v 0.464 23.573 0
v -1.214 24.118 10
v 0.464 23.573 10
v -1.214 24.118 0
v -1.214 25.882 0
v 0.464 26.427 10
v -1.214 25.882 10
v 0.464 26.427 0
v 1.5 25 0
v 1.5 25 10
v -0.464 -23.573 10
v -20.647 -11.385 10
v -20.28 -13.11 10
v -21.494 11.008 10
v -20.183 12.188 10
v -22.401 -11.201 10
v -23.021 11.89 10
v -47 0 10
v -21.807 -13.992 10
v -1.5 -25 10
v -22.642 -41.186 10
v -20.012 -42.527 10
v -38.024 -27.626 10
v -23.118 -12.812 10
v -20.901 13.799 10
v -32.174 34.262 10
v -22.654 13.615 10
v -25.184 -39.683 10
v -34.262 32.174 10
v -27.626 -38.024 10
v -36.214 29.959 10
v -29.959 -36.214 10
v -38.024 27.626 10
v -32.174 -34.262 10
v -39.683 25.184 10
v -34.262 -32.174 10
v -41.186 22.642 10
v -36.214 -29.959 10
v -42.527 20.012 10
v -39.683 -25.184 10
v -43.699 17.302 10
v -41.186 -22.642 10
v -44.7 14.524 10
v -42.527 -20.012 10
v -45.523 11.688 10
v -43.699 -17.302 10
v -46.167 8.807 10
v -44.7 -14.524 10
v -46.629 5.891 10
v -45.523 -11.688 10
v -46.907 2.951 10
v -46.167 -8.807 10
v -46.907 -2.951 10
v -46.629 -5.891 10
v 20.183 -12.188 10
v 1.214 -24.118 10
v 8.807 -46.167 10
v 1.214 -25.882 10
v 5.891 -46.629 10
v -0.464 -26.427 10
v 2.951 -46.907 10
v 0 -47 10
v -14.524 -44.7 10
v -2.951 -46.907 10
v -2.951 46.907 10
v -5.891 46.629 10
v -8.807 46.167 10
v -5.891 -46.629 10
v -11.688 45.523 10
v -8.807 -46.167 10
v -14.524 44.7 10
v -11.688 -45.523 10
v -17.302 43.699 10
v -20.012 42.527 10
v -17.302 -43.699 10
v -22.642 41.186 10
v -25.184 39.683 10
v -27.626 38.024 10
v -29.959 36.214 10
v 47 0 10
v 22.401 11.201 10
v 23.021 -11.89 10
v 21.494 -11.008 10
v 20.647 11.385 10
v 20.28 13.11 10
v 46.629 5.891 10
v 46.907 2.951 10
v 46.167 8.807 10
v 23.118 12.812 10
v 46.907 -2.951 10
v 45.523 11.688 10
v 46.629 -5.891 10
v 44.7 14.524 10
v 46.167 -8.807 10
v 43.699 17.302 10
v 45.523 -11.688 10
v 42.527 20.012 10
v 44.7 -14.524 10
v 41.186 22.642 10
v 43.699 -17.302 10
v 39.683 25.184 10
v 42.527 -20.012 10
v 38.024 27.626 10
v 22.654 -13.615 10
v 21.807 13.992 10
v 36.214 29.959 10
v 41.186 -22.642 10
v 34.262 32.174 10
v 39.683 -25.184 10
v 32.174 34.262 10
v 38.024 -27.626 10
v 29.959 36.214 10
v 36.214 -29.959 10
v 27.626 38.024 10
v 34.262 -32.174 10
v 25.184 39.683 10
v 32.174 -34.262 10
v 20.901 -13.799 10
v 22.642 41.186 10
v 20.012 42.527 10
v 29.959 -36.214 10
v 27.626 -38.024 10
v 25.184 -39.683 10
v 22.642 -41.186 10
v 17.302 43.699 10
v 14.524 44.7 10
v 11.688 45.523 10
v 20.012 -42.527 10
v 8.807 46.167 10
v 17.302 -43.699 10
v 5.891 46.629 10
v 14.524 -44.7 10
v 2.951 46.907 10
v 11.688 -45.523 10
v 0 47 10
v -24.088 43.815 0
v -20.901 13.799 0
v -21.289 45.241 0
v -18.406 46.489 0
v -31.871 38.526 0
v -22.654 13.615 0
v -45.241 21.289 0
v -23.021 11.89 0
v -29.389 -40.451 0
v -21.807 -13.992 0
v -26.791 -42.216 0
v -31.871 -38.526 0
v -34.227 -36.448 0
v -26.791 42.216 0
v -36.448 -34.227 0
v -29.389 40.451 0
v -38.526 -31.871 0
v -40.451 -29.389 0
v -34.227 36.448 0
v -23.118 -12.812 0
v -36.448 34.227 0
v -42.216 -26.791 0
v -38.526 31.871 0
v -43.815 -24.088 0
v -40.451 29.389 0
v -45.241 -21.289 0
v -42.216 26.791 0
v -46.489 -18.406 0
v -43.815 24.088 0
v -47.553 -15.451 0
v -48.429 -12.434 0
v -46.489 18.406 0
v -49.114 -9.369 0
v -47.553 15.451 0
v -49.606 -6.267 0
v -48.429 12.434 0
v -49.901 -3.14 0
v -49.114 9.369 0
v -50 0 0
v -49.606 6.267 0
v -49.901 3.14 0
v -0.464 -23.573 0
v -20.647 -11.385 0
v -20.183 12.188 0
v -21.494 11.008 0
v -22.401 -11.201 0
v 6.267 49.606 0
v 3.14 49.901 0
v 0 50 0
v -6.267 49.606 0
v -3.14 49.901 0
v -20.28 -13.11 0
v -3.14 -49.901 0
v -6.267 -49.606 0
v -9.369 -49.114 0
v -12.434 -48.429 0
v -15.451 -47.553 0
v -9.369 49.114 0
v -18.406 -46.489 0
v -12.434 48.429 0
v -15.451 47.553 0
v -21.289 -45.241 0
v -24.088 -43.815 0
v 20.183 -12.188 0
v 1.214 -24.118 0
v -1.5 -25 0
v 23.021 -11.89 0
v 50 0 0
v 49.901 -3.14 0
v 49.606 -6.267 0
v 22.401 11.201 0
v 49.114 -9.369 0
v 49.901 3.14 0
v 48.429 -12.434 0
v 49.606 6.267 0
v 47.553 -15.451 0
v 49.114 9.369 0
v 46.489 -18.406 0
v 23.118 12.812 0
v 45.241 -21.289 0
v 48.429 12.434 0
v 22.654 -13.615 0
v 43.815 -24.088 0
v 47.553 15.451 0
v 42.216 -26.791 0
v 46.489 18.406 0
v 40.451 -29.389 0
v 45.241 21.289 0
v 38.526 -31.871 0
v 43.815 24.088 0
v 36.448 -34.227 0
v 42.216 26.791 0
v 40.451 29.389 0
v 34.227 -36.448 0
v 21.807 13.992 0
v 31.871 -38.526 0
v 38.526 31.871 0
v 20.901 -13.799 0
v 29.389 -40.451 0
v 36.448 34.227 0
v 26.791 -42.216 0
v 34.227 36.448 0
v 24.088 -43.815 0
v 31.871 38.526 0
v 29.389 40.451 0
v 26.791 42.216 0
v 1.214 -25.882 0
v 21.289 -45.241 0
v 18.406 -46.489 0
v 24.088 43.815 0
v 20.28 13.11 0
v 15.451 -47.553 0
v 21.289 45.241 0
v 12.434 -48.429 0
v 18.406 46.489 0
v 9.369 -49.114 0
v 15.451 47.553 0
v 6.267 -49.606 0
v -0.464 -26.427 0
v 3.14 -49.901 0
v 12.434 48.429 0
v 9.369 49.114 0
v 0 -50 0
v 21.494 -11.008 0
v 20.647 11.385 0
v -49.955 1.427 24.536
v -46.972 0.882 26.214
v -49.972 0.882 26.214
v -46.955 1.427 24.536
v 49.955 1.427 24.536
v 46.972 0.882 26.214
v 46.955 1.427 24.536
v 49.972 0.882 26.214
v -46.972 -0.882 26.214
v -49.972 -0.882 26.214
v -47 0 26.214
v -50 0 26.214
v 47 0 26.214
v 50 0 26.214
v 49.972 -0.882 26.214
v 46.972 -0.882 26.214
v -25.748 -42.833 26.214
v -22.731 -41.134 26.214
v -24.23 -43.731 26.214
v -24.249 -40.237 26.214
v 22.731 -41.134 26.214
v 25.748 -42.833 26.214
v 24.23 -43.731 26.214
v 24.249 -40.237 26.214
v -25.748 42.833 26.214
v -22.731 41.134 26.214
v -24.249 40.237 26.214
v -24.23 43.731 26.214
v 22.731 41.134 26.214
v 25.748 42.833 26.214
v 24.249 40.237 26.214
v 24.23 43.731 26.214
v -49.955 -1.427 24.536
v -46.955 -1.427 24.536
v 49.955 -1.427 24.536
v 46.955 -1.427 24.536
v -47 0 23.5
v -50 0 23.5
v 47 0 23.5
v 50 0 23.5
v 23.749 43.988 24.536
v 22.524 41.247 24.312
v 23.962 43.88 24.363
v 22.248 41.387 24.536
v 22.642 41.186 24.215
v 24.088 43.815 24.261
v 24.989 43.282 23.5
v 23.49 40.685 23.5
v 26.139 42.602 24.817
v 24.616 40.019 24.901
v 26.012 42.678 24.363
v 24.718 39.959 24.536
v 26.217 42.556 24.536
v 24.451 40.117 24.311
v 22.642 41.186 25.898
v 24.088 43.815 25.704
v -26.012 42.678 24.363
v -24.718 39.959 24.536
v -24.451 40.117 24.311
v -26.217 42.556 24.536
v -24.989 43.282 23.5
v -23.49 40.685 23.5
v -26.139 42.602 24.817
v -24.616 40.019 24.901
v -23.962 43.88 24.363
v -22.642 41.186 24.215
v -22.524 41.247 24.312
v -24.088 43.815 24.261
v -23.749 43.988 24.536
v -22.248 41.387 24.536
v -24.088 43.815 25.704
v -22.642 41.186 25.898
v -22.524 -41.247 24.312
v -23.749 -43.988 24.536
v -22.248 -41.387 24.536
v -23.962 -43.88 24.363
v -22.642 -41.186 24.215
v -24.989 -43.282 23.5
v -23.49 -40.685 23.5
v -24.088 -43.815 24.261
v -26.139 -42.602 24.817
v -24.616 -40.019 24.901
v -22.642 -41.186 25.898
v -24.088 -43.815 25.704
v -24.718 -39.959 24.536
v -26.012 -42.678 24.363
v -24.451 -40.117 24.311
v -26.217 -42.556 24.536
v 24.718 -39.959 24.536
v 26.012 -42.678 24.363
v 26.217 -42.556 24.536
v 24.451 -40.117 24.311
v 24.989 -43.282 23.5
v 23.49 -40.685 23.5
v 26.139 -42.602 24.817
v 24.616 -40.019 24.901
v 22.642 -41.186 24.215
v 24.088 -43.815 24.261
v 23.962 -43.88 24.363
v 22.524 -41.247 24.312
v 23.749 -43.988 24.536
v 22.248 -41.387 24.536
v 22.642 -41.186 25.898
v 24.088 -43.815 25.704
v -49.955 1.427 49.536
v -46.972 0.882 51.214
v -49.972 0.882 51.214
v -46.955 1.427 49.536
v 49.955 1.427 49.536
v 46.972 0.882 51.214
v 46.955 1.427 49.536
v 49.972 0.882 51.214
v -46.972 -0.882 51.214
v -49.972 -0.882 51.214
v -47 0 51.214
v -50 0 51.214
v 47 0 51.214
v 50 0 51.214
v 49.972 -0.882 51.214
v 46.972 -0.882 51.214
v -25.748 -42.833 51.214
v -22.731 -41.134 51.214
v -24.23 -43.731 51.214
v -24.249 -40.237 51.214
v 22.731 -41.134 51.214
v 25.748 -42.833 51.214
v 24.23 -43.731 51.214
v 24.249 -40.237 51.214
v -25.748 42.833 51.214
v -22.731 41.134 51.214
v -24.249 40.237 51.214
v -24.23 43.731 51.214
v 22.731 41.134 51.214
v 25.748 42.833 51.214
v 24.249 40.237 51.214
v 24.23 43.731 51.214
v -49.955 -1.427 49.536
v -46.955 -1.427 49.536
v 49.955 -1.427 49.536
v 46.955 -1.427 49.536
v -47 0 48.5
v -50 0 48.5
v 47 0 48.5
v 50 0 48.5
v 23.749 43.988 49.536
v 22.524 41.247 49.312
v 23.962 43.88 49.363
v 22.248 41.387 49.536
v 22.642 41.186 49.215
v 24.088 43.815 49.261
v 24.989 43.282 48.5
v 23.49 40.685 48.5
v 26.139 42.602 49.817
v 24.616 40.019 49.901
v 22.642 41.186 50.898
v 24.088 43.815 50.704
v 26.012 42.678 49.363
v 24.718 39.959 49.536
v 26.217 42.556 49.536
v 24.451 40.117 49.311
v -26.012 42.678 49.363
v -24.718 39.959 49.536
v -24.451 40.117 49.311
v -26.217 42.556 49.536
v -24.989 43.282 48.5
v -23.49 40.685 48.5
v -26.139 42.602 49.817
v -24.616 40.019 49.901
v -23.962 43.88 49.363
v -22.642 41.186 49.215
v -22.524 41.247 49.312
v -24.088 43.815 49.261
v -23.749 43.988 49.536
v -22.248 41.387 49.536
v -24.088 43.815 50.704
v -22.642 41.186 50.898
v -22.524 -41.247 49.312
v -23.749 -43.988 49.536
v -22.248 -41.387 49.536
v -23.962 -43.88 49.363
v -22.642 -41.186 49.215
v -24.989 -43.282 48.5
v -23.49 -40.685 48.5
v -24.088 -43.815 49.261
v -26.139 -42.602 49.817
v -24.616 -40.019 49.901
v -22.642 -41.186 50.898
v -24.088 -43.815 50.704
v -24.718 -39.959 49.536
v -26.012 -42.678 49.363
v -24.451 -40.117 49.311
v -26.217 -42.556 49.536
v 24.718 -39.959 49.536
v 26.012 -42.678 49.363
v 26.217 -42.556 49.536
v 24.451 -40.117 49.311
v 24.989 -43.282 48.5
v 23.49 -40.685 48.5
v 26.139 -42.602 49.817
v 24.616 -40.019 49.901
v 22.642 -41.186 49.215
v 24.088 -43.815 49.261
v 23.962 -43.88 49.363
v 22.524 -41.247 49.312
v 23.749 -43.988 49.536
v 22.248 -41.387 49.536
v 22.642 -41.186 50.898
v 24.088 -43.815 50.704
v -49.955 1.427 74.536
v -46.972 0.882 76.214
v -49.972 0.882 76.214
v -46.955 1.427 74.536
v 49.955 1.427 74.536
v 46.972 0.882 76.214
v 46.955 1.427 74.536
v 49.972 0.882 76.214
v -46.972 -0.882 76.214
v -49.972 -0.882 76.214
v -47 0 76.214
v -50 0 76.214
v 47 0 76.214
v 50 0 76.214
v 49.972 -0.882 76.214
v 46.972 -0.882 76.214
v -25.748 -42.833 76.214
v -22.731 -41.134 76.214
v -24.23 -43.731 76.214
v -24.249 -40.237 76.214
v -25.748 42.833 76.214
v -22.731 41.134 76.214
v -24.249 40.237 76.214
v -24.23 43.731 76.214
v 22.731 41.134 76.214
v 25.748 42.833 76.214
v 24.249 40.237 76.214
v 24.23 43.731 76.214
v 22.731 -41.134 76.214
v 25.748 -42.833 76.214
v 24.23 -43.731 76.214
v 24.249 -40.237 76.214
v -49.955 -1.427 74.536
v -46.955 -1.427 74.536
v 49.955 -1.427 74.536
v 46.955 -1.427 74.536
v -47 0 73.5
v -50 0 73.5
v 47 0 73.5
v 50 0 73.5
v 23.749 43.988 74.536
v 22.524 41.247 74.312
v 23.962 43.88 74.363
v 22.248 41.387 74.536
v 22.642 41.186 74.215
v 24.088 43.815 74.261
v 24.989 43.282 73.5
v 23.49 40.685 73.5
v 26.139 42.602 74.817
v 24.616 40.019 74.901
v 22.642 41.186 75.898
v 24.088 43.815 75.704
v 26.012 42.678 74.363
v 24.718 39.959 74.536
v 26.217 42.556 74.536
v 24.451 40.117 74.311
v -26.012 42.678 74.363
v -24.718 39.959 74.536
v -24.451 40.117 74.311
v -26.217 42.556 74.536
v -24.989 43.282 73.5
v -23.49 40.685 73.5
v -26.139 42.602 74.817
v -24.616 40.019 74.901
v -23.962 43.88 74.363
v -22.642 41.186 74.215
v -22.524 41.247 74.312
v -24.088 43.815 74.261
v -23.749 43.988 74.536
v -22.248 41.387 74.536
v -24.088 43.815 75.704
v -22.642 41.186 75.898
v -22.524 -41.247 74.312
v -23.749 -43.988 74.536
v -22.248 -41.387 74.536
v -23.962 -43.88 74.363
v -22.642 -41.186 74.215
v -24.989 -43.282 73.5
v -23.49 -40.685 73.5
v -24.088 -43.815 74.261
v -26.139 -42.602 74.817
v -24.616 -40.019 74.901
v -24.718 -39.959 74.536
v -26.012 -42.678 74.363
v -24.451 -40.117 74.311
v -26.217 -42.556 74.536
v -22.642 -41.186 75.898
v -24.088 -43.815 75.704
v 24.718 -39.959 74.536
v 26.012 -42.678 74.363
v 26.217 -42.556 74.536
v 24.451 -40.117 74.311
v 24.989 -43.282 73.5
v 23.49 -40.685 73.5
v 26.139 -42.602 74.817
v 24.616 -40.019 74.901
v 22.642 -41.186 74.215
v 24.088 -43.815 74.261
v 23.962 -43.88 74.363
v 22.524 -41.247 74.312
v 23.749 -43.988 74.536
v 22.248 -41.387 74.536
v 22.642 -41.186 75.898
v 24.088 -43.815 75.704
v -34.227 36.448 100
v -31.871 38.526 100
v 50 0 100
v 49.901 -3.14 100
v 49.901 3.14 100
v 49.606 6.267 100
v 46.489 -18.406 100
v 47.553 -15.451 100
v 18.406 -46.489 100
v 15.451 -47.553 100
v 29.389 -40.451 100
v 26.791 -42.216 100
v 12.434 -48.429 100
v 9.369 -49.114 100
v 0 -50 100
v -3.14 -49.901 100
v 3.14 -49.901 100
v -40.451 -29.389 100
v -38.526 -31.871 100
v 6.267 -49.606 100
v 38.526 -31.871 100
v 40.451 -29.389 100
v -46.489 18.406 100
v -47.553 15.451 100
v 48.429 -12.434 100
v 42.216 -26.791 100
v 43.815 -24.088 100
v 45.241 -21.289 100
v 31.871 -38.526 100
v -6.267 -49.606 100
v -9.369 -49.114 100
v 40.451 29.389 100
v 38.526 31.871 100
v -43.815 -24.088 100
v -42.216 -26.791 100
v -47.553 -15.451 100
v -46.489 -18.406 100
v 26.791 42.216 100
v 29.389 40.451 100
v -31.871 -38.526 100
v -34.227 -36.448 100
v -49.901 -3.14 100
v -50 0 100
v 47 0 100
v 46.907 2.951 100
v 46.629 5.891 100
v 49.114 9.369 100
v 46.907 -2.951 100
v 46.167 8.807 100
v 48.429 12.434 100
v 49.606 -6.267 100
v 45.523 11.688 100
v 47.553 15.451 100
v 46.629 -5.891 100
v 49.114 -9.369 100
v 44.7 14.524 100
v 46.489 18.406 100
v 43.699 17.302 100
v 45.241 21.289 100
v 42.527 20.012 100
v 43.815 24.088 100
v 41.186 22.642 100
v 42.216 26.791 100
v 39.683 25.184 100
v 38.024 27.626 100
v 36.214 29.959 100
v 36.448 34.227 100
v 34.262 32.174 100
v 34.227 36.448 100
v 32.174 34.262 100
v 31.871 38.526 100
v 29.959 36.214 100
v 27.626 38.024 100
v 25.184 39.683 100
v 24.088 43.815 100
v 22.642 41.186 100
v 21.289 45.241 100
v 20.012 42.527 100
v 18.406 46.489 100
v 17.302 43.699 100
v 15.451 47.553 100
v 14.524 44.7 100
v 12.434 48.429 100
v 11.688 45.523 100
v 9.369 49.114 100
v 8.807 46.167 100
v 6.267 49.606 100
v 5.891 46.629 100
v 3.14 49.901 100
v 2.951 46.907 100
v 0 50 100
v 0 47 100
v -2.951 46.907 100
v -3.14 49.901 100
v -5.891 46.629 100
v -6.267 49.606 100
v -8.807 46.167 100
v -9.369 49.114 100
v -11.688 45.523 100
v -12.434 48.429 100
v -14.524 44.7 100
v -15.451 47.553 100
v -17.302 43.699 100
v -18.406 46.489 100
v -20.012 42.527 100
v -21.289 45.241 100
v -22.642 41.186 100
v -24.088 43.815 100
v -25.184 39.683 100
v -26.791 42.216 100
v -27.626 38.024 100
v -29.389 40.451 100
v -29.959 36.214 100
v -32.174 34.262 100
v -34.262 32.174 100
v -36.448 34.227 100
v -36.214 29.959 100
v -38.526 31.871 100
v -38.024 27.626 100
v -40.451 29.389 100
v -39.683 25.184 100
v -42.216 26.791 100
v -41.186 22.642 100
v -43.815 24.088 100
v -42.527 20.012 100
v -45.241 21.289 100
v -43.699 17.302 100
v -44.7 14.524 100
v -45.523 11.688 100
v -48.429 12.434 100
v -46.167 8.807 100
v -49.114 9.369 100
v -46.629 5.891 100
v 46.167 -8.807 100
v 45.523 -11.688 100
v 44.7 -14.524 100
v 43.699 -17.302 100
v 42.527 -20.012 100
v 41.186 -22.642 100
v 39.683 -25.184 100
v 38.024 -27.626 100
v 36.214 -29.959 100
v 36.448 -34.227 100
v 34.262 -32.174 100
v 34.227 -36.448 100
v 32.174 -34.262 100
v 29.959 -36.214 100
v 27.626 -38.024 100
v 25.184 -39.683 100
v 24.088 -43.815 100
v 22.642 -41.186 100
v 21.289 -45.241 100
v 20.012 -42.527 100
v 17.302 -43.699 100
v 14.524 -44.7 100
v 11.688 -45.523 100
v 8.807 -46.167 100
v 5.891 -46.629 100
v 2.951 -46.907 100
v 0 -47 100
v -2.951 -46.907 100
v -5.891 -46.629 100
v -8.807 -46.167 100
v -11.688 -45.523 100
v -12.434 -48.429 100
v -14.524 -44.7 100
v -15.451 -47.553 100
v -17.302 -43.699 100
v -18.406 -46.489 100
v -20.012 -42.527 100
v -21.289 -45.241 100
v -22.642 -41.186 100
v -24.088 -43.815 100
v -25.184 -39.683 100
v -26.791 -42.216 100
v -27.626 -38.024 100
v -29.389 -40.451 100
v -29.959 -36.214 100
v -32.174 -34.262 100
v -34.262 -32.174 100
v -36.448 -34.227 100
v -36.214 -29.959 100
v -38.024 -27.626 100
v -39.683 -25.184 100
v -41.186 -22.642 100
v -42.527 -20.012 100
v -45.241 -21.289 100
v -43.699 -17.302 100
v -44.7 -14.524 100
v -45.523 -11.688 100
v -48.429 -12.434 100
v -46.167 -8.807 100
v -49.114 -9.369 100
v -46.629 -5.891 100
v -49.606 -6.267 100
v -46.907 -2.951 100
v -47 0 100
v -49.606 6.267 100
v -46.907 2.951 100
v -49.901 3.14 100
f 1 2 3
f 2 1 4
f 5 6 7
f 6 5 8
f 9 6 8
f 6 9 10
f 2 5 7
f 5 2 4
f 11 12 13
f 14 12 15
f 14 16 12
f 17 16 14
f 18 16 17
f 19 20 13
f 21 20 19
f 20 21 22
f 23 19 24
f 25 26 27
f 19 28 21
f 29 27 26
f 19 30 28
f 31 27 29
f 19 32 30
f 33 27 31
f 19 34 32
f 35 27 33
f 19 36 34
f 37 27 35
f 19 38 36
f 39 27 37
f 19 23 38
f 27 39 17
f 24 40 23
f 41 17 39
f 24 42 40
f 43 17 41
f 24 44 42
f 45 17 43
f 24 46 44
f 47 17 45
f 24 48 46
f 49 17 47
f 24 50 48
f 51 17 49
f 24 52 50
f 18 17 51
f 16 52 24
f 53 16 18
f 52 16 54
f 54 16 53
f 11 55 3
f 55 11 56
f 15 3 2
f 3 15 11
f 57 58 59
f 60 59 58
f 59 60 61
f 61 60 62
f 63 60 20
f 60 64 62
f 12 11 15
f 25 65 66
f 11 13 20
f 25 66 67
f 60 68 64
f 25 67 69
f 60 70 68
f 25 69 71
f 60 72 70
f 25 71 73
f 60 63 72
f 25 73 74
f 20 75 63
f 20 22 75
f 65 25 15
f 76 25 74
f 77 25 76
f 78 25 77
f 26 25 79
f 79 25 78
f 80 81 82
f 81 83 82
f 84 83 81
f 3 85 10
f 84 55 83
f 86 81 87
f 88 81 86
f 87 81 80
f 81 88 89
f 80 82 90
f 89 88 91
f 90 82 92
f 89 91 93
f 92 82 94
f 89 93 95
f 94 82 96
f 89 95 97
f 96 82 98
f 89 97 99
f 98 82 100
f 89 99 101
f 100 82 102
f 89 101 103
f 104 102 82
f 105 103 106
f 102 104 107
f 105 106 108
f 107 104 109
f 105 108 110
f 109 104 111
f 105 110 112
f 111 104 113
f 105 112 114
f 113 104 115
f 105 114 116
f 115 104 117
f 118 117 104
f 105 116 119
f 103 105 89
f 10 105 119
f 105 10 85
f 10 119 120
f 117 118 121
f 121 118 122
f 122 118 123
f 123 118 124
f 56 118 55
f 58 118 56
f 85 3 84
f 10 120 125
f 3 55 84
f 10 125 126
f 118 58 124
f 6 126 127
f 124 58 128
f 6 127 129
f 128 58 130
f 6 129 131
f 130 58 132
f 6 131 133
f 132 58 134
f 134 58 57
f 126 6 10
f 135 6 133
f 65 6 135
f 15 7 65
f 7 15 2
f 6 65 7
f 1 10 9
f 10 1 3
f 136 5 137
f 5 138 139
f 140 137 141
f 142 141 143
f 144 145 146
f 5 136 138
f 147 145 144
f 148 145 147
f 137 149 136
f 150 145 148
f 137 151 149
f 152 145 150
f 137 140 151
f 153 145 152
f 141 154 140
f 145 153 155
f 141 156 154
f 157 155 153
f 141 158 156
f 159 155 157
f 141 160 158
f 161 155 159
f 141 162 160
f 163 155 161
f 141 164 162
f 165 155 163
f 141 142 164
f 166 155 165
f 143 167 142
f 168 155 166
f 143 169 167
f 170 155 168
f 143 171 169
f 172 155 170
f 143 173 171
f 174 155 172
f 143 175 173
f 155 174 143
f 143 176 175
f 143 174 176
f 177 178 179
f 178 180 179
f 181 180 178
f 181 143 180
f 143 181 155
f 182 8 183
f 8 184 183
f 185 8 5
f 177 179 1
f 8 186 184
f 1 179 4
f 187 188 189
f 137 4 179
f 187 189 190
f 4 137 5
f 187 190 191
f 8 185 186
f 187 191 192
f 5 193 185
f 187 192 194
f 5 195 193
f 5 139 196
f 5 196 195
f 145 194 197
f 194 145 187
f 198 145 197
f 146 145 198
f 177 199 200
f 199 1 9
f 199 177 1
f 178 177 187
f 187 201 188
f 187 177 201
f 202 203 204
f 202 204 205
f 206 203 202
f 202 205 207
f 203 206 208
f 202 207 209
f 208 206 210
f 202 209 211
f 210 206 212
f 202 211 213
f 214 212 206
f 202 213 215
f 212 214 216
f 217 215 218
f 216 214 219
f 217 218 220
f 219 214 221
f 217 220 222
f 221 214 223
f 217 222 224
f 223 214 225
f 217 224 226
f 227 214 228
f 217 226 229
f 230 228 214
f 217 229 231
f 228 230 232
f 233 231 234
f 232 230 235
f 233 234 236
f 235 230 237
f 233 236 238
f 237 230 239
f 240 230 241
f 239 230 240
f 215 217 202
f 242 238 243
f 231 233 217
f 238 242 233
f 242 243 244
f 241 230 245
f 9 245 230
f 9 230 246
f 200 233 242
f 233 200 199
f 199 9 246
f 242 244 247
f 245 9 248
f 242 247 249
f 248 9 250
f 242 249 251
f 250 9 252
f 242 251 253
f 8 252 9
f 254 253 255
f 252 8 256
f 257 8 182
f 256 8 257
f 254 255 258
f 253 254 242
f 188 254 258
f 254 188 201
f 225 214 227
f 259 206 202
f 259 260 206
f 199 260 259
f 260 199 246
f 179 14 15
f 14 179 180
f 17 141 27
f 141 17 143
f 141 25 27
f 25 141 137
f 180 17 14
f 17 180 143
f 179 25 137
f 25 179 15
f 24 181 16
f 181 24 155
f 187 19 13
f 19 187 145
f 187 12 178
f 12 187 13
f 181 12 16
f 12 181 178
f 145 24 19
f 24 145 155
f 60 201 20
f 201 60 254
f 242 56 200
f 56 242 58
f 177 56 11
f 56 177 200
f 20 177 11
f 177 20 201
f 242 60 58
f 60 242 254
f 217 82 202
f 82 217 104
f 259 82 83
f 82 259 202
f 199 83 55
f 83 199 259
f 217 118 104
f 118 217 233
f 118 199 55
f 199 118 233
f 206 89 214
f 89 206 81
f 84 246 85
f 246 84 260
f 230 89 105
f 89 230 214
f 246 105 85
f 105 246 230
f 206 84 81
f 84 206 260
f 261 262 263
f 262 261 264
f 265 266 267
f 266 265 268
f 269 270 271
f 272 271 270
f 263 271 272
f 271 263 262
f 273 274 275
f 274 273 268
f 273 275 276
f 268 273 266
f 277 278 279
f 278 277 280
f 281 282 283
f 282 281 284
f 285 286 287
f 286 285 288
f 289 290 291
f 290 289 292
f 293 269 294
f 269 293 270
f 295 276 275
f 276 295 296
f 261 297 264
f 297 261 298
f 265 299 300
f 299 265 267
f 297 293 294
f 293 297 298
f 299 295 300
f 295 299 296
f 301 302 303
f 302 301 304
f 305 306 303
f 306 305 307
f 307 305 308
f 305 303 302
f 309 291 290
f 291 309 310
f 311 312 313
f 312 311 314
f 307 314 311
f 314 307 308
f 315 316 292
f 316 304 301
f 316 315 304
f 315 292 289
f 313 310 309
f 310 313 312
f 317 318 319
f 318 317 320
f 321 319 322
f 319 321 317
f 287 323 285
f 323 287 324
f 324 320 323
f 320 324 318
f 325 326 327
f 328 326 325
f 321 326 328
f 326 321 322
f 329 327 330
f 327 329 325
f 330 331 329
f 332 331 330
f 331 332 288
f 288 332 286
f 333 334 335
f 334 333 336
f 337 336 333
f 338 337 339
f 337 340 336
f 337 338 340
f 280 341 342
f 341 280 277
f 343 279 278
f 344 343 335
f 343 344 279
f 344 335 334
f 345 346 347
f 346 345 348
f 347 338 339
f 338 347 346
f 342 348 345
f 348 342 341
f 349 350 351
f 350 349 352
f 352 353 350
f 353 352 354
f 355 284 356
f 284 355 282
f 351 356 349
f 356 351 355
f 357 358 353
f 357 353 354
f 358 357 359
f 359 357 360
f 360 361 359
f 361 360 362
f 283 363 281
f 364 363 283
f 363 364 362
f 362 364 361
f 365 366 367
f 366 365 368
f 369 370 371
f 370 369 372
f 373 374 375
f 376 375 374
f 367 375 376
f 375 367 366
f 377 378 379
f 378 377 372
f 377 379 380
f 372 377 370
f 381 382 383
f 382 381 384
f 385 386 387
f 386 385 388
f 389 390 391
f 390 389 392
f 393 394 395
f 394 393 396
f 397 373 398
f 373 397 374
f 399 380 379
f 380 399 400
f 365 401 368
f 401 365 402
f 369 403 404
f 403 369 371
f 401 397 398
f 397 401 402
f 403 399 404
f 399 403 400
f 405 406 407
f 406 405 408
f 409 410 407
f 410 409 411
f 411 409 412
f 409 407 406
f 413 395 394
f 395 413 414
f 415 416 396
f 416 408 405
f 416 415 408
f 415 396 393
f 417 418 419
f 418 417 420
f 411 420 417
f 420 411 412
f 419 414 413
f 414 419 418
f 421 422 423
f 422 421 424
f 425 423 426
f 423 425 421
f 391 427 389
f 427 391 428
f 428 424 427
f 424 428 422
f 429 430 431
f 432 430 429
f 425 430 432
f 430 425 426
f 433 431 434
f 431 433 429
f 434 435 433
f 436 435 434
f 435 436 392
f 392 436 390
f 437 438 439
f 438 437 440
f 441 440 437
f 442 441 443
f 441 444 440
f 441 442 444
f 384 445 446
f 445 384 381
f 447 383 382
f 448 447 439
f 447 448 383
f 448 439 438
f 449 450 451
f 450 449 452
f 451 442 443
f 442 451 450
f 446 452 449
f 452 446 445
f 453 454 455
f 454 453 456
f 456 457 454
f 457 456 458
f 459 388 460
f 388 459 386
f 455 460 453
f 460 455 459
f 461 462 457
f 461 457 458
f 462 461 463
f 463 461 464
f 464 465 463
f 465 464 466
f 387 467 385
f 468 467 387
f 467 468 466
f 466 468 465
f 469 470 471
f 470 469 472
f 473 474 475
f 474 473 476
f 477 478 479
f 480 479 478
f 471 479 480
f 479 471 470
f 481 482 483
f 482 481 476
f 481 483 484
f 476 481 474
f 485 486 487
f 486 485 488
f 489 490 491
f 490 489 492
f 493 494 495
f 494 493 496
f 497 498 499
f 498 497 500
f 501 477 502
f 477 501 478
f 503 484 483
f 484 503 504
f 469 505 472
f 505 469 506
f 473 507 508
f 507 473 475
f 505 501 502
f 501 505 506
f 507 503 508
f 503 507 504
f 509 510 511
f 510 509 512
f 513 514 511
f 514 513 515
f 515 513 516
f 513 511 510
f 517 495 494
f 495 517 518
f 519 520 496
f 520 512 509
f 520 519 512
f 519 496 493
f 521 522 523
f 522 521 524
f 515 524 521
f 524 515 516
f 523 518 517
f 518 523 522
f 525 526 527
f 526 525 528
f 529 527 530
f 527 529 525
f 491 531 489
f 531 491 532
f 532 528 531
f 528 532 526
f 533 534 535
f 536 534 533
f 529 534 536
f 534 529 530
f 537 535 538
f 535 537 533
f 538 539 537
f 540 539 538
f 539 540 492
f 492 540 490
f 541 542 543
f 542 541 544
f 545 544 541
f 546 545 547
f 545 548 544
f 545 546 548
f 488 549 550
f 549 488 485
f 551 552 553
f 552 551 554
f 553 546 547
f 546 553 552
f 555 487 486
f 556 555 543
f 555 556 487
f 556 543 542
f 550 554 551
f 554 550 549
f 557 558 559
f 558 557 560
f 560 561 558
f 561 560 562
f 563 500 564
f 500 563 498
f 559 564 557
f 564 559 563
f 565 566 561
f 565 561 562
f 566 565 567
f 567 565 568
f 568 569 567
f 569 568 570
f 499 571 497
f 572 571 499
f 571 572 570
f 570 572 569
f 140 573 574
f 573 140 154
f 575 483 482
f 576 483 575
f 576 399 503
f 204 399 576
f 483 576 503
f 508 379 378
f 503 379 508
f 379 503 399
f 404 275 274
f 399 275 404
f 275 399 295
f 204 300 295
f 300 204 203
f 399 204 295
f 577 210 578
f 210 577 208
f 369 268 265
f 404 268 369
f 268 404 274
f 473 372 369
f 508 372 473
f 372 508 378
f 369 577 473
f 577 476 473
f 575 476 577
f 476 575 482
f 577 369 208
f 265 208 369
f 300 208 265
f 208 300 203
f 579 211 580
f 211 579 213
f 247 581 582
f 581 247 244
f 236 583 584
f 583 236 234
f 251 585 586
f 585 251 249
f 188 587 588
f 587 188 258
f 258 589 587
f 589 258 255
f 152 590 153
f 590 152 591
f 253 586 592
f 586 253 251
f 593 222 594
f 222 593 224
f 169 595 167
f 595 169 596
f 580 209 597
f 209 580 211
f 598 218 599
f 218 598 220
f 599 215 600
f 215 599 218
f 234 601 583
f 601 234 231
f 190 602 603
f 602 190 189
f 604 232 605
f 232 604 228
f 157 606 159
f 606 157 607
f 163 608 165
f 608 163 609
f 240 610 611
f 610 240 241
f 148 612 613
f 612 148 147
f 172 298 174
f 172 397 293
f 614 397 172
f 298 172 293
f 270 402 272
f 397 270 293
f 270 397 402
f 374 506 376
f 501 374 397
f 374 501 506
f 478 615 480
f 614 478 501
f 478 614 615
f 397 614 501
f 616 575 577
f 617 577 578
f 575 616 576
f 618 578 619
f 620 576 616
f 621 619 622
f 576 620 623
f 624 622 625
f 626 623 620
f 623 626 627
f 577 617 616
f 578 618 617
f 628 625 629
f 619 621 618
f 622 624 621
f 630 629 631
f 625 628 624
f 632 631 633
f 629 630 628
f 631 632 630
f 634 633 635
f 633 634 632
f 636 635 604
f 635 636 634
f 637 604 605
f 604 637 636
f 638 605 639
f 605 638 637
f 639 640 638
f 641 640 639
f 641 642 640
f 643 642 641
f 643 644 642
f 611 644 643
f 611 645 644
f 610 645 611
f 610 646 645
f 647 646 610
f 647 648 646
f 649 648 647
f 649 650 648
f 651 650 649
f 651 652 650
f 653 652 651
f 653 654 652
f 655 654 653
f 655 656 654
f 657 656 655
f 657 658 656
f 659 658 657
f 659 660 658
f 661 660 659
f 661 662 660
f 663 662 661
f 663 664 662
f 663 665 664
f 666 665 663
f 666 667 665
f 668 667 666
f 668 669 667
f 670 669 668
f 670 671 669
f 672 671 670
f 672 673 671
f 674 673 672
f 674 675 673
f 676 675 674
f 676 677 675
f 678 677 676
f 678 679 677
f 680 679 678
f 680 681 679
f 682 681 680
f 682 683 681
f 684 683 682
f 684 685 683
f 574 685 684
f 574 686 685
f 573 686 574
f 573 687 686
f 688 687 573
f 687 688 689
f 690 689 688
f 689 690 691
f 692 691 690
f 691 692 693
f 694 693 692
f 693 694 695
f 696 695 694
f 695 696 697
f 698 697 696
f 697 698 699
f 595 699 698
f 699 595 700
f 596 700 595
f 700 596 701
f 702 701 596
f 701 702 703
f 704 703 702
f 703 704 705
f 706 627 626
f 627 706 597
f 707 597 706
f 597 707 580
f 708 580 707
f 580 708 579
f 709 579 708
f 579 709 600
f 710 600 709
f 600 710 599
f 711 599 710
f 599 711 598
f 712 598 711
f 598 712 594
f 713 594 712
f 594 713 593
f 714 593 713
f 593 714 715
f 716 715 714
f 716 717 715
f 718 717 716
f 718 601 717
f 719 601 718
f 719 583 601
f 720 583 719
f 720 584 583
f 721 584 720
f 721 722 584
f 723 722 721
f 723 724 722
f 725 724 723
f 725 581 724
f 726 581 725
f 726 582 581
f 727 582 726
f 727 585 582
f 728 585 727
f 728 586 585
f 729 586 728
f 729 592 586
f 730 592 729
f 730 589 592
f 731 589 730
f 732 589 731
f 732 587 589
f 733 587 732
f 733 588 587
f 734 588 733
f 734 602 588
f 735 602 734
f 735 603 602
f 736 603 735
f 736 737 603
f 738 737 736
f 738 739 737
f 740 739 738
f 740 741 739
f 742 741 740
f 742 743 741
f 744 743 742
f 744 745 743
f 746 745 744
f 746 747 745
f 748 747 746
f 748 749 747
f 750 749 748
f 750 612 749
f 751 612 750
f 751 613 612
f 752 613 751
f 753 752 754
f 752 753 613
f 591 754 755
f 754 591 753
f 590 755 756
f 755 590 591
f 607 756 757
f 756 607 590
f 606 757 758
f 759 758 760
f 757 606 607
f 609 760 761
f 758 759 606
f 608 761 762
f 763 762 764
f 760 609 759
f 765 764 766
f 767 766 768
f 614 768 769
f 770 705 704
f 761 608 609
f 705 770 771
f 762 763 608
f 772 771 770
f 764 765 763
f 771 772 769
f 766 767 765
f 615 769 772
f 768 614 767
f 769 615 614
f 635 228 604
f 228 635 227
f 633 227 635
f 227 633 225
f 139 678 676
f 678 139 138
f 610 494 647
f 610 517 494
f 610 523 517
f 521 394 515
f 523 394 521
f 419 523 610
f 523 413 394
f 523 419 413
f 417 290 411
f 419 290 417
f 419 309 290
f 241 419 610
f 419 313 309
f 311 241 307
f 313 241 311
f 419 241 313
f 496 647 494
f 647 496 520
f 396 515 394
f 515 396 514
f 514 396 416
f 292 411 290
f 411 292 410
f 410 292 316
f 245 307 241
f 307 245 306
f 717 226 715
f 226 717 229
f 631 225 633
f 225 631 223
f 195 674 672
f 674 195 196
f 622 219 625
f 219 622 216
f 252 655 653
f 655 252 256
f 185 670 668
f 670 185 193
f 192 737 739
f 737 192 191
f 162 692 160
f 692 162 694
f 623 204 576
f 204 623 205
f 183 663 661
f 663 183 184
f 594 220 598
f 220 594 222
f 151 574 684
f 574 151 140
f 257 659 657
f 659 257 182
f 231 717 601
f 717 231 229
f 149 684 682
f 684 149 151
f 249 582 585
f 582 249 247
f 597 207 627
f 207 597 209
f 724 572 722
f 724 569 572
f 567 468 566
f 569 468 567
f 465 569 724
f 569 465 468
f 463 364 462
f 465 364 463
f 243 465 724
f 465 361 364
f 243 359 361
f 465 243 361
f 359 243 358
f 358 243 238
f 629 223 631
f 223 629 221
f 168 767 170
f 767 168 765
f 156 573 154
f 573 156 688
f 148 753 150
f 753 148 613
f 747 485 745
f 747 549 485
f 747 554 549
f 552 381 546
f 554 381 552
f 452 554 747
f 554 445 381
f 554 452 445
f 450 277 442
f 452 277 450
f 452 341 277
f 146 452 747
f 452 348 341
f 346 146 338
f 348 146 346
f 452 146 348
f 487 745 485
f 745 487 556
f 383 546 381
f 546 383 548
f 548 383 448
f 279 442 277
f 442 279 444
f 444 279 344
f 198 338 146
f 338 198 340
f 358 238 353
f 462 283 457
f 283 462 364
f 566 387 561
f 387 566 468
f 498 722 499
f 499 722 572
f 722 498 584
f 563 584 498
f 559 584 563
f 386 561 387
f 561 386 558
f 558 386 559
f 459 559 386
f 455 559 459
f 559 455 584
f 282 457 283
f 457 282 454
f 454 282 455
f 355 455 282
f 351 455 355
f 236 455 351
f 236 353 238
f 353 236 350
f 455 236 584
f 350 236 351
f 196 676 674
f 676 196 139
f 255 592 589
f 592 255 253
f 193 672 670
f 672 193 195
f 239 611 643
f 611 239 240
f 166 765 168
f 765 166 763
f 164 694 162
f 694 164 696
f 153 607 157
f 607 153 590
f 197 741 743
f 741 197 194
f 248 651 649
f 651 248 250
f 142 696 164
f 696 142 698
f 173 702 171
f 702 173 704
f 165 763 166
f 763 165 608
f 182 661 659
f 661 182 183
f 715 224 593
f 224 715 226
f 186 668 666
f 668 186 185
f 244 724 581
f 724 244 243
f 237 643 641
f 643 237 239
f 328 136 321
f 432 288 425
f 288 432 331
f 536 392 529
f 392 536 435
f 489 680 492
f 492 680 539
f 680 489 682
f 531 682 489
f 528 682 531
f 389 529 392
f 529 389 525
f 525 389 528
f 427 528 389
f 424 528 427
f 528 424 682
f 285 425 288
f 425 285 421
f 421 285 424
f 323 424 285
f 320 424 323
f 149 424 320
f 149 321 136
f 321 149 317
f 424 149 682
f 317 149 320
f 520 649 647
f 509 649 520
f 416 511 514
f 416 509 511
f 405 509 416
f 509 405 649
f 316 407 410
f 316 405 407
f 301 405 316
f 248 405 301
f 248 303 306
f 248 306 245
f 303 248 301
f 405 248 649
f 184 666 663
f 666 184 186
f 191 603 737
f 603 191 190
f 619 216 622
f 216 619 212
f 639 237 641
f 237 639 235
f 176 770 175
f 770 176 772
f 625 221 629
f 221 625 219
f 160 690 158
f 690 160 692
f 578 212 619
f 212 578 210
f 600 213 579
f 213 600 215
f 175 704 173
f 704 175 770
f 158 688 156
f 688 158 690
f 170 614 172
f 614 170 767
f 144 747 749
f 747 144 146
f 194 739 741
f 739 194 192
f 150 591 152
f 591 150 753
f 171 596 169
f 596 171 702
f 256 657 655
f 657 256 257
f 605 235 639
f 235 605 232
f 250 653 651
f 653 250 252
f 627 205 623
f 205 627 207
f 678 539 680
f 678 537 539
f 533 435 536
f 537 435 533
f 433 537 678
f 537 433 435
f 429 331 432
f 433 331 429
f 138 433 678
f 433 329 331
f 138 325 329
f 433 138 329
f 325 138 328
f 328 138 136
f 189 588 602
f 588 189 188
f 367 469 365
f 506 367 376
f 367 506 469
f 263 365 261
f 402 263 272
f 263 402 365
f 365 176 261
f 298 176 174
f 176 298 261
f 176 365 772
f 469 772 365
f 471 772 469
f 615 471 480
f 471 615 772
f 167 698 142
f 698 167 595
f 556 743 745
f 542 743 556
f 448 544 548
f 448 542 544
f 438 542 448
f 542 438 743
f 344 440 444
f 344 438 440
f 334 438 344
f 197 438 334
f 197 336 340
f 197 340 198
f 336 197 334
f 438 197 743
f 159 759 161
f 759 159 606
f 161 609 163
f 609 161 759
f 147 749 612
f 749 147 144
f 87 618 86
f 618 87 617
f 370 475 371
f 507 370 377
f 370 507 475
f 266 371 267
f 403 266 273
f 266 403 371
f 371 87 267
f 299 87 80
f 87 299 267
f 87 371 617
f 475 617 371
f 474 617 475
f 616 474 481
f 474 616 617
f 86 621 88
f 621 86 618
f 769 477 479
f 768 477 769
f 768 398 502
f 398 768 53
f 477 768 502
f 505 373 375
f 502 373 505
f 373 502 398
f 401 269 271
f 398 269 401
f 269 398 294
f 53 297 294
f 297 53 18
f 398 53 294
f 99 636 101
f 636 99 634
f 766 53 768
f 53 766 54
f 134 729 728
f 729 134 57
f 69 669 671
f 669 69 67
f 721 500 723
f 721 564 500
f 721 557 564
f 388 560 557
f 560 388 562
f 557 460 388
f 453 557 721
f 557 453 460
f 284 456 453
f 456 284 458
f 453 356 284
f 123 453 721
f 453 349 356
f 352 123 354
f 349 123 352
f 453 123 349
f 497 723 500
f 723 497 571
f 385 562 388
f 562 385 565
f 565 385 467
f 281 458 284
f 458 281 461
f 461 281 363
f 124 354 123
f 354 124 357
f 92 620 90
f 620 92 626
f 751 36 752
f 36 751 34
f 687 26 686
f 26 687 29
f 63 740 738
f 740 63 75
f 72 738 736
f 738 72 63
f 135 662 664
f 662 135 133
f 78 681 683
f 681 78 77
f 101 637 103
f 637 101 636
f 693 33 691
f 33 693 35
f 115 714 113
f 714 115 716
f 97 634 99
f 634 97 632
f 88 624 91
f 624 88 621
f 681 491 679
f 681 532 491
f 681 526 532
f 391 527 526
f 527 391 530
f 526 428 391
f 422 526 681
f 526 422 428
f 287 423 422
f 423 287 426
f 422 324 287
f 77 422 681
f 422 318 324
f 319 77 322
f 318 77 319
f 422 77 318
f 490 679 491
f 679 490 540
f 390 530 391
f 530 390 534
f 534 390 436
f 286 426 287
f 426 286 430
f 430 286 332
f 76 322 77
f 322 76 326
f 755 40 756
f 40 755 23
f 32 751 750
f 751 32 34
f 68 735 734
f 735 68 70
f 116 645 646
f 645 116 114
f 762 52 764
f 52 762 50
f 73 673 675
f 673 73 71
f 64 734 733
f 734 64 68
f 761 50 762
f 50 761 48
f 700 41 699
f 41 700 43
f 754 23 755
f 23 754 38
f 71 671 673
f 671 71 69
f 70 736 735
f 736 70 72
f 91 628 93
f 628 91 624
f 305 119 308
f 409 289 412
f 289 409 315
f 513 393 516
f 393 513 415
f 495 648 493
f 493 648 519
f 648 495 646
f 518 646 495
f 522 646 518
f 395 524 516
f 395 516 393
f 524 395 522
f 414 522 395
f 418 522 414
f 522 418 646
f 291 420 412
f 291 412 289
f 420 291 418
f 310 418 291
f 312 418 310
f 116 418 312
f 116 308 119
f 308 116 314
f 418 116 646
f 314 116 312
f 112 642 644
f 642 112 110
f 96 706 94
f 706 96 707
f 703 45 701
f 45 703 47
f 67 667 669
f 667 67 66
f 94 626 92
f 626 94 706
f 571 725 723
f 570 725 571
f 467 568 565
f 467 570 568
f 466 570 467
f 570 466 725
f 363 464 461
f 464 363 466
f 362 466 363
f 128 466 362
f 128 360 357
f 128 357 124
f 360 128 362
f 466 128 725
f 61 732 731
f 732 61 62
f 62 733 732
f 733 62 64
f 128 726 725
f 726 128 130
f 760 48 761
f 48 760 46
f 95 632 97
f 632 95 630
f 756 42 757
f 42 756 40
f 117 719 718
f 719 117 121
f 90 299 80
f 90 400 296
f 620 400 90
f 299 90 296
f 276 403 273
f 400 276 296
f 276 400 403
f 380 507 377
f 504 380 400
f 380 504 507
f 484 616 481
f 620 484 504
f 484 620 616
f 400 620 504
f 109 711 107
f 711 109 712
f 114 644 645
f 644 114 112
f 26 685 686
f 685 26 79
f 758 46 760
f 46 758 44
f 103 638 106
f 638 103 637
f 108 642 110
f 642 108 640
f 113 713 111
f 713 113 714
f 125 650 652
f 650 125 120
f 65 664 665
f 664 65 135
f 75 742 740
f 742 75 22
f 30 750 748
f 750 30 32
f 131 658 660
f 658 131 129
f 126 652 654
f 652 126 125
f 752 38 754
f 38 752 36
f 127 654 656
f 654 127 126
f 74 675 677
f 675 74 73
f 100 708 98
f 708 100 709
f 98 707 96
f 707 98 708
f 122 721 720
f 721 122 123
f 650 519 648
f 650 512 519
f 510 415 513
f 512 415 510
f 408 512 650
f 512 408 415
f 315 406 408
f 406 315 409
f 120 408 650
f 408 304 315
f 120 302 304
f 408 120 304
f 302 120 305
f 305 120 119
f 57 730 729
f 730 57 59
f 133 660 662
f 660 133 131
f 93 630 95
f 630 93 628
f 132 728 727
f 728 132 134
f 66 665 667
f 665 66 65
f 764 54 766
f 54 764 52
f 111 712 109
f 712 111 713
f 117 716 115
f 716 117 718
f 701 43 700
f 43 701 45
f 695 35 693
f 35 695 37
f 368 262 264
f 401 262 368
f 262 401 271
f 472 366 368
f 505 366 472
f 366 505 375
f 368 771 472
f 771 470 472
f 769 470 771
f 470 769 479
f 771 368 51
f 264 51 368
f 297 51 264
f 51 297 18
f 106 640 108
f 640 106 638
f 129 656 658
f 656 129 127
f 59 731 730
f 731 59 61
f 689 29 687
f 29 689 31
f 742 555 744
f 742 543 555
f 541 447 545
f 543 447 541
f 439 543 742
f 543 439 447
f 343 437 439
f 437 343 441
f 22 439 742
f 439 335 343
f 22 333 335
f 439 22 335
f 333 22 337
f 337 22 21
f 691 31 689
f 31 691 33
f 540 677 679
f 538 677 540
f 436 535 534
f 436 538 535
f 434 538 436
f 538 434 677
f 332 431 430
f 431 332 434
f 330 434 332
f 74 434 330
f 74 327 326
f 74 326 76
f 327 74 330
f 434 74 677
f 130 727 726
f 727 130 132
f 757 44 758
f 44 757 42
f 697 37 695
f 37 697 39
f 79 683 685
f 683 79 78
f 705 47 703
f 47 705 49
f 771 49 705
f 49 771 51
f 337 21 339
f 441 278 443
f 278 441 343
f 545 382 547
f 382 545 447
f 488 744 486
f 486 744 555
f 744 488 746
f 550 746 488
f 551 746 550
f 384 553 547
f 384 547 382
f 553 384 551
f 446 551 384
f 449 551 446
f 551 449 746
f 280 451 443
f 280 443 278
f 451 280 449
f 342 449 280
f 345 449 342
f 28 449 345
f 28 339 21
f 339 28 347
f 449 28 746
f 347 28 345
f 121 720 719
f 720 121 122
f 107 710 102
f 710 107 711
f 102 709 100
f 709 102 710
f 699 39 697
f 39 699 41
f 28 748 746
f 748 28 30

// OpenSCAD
//Variable Description

MoldRadius=50; // Possible Values
MoldHeight=100; // Possible Values
HoleR=1.5; // Possible Values
Wall=(MoldRadius-3);

difference() {
	cylinder(r=MoldRadius, h=MoldHeight, $fn=100);
		translate([0, 0, 10])
		cylinder(r=Wall, h=MoldHeight, $fn=100);
		
//Bottom Holes
		for ( i = [0 : 5] )
			{
    				rotate( i * 360 / 6, [0, 0, 1])
    				translate([0, MoldRadius/2, 0])
    				cylinder(r = HoleR, h=10);
			}
// Side Holes

for ( z = [0 : 2] )

	{		
		for ( i = [0 : 5] )
			{
    				rotate( i * 360 / 6, [0, 0, 1])
    				translate([0, 0, MoldHeight/4 * (z+1)])
				rotate([0,90,0])
    				cylinder(r = HoleR, h=MoldRadius+10);
			}

		}
 	}
